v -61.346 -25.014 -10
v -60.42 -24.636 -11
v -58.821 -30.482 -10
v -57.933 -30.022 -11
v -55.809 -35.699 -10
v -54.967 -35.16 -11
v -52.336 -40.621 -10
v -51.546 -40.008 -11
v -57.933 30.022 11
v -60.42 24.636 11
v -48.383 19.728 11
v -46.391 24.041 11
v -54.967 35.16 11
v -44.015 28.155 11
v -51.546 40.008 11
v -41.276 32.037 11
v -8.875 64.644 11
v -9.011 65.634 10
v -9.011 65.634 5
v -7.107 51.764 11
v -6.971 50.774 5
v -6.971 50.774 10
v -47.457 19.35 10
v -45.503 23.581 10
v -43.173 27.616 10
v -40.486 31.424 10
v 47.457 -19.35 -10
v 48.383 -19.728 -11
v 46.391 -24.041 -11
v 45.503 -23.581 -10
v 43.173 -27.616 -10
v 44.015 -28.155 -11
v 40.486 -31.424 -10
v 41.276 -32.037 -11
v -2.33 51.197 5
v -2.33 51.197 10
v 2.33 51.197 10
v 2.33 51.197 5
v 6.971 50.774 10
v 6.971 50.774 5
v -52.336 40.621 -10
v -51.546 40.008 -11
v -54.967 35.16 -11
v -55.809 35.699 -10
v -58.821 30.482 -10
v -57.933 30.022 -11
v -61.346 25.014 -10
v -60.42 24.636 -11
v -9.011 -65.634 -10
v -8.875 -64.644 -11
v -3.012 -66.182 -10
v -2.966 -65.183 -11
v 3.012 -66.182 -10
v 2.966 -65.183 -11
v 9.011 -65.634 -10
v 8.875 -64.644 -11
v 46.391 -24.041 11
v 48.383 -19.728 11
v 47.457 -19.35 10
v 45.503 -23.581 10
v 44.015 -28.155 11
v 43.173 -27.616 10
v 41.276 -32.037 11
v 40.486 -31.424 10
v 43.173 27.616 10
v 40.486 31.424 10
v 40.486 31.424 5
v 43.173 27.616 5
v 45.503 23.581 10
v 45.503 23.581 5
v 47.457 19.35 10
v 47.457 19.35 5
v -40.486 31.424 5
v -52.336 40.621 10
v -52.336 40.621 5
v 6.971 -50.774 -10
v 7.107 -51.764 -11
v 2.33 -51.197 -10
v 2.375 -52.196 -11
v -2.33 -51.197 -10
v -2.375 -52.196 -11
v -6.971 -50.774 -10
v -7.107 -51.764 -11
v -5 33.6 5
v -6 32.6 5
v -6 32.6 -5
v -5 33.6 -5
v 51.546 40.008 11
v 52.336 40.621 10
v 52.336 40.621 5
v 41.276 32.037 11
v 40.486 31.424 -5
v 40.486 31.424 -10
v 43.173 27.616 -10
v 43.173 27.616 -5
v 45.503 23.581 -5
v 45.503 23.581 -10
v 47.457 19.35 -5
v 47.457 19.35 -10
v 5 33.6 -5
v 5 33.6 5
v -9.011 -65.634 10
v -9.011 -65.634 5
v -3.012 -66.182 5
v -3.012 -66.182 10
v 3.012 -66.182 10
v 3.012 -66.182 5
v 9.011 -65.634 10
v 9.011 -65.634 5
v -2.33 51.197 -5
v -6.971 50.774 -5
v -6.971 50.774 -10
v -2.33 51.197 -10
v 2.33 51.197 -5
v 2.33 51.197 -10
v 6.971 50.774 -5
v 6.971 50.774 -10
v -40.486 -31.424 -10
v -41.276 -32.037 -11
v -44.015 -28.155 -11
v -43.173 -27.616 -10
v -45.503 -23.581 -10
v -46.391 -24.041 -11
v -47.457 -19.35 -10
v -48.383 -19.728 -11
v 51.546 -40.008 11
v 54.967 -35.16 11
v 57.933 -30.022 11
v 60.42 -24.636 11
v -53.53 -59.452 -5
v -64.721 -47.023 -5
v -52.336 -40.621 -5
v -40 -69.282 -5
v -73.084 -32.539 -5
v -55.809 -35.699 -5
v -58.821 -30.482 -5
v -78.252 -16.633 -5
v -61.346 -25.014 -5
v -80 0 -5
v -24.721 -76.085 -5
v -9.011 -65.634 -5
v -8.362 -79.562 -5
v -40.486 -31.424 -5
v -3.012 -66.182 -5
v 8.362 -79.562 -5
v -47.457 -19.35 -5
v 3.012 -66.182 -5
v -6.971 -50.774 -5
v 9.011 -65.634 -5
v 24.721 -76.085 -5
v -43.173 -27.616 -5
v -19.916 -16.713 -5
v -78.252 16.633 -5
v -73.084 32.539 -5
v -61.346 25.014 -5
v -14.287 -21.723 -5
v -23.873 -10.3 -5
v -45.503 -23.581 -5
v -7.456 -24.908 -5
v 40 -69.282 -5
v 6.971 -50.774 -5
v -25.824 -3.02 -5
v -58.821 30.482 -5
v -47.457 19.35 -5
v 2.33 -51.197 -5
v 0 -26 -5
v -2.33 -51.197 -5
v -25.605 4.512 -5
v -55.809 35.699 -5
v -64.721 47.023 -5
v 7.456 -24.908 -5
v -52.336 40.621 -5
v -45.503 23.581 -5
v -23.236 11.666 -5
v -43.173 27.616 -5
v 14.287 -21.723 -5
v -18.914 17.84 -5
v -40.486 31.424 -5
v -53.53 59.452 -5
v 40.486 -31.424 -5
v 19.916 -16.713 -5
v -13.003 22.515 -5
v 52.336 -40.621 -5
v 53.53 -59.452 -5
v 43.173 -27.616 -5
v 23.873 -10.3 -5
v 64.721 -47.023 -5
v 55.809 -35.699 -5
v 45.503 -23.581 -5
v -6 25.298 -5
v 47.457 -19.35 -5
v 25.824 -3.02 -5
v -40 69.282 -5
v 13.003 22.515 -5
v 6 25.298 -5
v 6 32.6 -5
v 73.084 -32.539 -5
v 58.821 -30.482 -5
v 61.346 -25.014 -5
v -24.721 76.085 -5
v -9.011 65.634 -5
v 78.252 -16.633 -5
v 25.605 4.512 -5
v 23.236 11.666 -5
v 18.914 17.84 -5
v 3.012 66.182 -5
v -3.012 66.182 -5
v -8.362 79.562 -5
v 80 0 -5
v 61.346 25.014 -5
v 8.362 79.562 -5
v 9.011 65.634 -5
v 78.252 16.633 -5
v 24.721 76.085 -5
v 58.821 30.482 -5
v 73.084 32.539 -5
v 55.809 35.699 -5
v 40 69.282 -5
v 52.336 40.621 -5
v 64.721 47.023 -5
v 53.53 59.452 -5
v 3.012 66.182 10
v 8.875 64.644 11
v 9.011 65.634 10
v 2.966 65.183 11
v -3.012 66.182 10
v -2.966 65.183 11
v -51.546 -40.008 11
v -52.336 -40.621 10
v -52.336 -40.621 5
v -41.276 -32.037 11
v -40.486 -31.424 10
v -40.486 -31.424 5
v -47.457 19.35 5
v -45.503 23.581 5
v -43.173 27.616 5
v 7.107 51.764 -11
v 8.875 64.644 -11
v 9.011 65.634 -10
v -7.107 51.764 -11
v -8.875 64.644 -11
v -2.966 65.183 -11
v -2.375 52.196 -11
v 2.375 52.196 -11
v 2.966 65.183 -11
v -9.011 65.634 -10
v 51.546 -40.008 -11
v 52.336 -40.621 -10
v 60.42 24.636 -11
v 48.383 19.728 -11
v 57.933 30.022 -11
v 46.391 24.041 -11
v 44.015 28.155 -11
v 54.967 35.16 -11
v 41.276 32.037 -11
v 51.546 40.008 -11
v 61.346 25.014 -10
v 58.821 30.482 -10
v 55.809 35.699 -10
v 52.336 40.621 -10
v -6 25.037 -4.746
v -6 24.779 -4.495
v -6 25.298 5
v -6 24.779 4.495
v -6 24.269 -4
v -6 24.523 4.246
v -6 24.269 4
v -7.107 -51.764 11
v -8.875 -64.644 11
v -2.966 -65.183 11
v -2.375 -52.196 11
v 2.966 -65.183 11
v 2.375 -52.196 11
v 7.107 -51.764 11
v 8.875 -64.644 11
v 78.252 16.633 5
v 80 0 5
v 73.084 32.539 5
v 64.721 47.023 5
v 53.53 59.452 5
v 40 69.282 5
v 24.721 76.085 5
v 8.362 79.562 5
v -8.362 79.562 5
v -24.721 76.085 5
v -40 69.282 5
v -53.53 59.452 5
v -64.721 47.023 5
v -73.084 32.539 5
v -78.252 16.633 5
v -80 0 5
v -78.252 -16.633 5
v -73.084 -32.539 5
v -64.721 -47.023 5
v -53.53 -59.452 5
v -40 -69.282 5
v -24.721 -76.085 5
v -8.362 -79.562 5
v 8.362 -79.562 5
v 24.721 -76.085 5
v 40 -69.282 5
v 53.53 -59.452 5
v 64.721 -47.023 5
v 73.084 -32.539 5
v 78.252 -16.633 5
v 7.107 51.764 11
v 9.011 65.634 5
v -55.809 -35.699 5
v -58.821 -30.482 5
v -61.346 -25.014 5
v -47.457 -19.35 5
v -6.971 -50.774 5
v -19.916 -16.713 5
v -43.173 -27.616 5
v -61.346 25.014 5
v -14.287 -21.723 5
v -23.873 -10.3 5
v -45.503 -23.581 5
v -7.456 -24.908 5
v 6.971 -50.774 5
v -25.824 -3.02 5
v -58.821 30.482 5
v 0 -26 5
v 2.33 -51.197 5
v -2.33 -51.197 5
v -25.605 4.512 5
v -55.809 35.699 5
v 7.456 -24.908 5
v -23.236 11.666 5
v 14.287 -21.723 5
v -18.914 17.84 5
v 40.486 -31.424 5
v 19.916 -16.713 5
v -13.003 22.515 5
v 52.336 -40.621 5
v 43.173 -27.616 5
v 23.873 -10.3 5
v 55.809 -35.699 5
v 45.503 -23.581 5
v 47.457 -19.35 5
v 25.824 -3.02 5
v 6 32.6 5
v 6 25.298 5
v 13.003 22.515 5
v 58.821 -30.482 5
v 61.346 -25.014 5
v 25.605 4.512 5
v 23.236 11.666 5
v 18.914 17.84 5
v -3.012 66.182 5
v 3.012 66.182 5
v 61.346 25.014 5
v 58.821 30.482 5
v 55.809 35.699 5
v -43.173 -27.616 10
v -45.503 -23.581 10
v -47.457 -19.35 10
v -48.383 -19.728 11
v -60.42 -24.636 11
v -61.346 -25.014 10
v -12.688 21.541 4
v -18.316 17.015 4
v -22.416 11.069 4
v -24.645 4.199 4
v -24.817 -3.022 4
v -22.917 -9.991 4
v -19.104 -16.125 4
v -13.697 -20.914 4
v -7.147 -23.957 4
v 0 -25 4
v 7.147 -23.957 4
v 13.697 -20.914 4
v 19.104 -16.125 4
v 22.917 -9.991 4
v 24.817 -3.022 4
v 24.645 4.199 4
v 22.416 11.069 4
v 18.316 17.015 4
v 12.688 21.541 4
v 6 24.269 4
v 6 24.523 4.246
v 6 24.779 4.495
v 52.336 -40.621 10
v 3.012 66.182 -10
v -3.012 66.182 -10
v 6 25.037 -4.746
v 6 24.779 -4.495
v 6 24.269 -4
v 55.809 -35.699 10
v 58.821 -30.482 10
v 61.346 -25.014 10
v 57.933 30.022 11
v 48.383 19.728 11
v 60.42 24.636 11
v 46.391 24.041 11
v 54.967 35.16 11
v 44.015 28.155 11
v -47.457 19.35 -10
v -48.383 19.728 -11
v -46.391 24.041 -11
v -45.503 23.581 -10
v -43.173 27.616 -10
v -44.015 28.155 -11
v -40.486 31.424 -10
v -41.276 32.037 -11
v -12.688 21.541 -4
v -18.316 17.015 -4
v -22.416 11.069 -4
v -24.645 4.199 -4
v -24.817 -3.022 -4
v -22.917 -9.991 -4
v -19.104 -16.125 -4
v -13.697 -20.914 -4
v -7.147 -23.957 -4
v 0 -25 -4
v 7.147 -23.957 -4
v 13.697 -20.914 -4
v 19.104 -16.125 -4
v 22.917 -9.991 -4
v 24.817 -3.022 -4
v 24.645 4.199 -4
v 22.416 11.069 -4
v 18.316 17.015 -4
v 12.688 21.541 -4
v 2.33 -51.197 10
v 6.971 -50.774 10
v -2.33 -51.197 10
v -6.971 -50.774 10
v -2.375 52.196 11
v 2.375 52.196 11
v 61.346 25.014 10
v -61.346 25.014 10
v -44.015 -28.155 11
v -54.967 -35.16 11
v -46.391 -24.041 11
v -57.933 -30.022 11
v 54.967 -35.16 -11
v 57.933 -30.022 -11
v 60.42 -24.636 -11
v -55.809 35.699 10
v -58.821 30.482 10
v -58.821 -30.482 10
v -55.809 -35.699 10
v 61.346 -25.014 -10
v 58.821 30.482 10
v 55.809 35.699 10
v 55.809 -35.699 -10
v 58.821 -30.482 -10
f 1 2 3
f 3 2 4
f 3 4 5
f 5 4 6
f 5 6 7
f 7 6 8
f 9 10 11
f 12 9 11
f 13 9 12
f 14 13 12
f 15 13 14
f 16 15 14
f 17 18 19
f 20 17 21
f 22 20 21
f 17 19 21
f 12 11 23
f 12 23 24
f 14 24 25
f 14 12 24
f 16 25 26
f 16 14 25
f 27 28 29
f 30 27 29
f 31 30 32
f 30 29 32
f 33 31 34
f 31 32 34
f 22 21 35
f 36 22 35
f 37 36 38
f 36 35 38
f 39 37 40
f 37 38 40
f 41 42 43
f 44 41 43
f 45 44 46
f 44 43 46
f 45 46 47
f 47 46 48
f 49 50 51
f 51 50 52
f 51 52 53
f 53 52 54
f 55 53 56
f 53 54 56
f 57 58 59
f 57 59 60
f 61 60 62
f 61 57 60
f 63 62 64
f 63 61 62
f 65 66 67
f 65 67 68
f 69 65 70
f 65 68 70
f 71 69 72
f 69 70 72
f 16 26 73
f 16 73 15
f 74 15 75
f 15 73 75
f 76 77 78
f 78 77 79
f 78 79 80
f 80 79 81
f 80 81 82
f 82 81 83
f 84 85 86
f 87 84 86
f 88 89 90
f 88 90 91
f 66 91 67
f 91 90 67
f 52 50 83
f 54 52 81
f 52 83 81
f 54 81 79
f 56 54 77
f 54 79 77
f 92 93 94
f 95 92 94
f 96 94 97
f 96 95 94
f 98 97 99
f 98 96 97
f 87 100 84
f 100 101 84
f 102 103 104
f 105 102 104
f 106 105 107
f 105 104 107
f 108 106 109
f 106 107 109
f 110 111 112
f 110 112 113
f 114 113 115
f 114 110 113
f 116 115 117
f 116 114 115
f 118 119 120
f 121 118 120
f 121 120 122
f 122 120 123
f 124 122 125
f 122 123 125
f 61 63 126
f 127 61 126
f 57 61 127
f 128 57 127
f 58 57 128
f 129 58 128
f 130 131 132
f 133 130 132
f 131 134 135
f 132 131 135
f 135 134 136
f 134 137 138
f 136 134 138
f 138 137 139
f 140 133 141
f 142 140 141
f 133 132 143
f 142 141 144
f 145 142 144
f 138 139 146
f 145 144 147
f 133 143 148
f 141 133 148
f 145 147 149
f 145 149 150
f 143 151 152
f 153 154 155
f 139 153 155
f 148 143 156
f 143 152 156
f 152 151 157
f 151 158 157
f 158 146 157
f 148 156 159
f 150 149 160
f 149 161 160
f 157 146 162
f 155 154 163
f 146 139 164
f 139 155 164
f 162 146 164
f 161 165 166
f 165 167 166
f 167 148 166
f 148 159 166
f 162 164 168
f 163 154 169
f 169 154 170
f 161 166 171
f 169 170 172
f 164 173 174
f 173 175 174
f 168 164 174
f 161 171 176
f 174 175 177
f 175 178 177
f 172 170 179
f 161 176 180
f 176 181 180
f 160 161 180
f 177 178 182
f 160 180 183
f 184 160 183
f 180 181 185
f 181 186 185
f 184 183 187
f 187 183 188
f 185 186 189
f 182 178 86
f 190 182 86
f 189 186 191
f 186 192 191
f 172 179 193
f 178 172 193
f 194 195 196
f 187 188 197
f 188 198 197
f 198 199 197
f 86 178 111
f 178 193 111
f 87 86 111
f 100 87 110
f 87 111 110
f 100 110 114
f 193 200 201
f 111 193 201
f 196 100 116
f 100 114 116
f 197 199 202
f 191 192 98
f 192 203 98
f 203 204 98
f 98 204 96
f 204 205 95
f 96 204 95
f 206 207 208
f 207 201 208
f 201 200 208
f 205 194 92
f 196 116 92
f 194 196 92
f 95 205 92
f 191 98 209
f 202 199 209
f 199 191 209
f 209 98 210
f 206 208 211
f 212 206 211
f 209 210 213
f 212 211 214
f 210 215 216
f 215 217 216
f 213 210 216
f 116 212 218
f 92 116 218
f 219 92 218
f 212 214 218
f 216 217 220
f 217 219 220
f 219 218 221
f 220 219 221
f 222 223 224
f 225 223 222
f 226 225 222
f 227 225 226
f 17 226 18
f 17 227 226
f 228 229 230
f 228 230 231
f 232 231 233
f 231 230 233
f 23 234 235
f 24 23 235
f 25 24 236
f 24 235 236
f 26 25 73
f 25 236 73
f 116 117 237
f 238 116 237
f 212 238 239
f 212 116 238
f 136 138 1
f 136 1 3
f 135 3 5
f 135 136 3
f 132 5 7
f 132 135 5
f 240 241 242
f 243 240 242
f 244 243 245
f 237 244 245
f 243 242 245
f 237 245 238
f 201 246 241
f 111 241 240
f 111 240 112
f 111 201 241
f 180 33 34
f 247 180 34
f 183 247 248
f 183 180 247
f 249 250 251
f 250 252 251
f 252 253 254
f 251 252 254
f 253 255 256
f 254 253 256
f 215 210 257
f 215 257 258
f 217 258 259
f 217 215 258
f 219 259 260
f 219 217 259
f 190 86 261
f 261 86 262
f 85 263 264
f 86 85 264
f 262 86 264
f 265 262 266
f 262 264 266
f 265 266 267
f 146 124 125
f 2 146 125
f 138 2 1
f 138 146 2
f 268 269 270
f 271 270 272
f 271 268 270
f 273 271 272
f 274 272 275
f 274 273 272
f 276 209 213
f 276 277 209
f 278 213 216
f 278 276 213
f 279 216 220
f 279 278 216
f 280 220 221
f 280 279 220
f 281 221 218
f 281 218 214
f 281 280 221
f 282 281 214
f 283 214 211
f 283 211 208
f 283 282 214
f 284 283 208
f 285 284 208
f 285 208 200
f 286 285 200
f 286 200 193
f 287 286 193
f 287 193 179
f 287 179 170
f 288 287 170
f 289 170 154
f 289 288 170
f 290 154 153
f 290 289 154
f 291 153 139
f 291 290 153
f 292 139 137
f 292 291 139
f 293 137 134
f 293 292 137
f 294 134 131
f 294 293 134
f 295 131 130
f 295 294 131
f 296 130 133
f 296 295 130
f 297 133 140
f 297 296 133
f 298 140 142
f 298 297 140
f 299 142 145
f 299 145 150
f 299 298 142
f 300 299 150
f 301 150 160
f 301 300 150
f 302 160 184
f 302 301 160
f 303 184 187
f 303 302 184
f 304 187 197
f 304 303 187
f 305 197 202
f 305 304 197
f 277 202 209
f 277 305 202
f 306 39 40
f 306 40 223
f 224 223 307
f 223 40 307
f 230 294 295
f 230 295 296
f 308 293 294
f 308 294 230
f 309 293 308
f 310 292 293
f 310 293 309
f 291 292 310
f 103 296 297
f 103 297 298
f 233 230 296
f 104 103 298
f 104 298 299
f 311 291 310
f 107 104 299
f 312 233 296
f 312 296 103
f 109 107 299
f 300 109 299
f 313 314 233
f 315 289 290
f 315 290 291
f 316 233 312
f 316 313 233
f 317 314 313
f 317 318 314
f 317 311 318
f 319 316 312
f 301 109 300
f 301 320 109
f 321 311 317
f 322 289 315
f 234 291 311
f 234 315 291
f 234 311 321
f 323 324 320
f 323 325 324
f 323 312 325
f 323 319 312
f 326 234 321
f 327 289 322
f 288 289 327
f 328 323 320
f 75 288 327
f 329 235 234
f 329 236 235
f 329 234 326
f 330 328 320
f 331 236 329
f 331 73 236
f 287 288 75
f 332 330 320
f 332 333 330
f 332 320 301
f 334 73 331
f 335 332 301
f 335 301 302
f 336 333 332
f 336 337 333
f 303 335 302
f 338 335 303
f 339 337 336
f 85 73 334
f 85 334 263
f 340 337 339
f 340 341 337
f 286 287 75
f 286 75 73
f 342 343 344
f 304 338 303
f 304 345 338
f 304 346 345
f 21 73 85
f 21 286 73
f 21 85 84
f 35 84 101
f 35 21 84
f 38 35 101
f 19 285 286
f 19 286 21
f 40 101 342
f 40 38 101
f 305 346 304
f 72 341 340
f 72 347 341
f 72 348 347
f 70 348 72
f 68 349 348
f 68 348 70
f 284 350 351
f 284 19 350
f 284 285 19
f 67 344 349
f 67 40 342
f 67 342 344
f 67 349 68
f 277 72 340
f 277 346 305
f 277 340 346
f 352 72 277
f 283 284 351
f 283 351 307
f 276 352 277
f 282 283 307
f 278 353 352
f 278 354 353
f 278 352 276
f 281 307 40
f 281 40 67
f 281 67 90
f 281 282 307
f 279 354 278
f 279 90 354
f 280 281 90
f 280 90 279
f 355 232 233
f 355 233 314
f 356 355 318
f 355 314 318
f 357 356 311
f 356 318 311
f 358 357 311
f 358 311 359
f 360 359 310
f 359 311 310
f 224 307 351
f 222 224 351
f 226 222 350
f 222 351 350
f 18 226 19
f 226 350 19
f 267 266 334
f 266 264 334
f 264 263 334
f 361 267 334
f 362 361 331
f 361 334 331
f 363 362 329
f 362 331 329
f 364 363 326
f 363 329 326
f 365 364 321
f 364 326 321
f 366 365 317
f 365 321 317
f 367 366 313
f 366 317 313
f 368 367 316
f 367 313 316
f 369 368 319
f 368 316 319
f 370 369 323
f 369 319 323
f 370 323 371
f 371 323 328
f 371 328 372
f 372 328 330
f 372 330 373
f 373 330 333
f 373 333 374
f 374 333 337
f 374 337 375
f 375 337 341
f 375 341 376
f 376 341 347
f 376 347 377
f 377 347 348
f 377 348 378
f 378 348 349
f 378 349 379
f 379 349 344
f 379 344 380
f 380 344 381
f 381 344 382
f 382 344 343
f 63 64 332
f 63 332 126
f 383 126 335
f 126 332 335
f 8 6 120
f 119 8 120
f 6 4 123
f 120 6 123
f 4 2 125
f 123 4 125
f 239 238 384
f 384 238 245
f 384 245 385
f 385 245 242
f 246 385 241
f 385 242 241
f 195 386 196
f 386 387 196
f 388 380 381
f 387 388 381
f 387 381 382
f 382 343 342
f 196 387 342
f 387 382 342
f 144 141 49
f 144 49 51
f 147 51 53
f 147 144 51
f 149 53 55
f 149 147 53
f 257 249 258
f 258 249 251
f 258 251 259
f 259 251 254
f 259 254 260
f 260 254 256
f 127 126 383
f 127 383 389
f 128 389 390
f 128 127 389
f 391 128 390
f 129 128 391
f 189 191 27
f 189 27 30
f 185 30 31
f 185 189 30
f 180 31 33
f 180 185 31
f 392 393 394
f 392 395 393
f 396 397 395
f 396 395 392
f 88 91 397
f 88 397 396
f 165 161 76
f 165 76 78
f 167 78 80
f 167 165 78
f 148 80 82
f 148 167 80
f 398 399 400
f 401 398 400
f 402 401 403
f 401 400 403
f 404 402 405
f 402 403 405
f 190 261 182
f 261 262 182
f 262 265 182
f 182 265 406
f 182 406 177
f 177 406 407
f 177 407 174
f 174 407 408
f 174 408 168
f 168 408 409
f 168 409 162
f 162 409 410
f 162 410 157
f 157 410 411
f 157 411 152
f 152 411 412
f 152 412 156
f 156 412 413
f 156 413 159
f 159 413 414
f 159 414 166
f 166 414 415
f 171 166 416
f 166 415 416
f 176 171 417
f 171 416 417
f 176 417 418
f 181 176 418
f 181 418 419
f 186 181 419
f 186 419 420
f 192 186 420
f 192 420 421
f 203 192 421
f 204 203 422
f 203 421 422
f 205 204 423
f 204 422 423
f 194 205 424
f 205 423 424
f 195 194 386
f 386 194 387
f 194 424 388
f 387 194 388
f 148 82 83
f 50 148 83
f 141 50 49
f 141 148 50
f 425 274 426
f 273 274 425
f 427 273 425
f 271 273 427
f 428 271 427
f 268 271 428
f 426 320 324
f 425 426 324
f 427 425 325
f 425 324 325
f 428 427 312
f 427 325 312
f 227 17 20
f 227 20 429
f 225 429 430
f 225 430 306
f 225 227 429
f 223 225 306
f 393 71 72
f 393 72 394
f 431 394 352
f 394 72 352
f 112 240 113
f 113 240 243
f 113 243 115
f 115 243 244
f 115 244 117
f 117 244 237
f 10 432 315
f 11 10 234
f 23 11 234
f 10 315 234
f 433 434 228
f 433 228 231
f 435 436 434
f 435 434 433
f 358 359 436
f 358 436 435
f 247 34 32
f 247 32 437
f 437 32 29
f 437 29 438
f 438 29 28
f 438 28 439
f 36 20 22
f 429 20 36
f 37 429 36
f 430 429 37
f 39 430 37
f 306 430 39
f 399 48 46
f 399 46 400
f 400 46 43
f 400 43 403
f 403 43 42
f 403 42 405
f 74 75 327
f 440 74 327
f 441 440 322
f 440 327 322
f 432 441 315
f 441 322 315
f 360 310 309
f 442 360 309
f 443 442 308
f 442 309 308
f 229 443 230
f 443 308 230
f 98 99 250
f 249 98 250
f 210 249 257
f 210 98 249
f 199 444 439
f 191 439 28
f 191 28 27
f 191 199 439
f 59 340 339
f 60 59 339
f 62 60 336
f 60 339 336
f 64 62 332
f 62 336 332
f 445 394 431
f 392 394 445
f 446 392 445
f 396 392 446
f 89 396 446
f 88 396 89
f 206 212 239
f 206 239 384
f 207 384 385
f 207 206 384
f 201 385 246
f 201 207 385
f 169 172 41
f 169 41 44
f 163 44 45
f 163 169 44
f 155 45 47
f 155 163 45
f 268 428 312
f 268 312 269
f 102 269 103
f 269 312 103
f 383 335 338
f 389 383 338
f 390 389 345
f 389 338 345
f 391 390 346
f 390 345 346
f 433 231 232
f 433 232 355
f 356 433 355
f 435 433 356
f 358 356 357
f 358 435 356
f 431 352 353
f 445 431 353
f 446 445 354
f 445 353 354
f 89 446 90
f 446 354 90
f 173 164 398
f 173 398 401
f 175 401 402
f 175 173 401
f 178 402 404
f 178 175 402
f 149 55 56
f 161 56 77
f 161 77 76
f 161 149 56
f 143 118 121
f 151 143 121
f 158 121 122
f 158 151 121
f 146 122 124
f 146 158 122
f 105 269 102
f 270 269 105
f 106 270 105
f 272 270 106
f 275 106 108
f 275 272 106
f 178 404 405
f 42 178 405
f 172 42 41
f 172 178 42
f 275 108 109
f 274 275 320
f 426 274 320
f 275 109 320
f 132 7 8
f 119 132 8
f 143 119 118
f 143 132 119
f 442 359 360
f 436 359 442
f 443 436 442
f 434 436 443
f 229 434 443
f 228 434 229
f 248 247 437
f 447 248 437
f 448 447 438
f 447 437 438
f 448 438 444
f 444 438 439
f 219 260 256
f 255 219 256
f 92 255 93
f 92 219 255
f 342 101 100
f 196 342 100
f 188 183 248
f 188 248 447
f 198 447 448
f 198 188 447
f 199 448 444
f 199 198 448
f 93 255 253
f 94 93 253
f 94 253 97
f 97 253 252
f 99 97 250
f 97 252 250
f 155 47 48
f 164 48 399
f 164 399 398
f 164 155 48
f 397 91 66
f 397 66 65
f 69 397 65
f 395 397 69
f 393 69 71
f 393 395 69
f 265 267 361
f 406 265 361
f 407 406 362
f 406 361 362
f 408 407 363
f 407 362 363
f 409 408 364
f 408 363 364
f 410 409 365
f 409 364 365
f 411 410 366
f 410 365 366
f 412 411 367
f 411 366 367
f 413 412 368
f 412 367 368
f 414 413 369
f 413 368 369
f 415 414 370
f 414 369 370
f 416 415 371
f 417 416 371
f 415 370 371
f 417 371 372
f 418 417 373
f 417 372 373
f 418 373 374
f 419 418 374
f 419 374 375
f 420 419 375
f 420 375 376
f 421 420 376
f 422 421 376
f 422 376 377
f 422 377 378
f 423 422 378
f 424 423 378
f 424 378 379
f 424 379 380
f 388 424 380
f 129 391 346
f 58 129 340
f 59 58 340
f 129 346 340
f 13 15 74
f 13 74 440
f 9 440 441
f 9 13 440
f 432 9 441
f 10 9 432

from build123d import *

# Parameters (mm, degrees)
SKETCH1_R                = 80
BOSS_EXTRUDE1_DEPTH      = 5
BOSS_EXTRUDE2_DEPTH      = 6
CHAMFER1_SIZE            = 1
CHAMFER1_OF_MIRROR1_SIZE = 1
CHAMFER2_SIZE            = 1
CHAMFER3_SIZE            = 1


with BuildPart() as part:
    # Sketch1 → Boss-Extrude1 (new body, symmetric)
    with BuildSketch(Plane.XY):
        Circle(SKETCH1_R)
        with BuildLine():
            Line((6, 24.269322199), (6, 33.6))
            Line((6, 33.6), (-6, 33.6))
            Line((-6, 33.6), (-6, 24.269322199))
            ThreePointArc((-6, 24.269322199), (0, -25), (6, 24.269322199))
        make_face(mode=Mode.SUBTRACT)
    extrude(amount=BOSS_EXTRUDE1_DEPTH, both=True)

    # Sketch2 → Boss-Extrude2 (add)
    with BuildSketch(Plane.XY.offset(5)):
        with BuildLine():
            ThreePointArc((-6.97050931, 50.773757985), (0, 51.25), (6.97050931, 50.773757985))
            Line((6.97050931, 50.773757985), (9.010658377, 65.634370079))
            ThreePointArc((9.010658377, 65.634370079), (0, 66.25), (-9.010658377, 65.634370079))
            Line((-9.010658377, 65.634370079), (-6.97050931, 50.773757985))
        make_face()
        with BuildLine():
            ThreePointArc((40.486109606, 31.423517133), (44.383801944, 25.625), (47.456618916, 19.350240853))
            Line((47.456618916, 19.350240853), (61.346361038, 25.01372598))
            ThreePointArc((61.346361038, 25.01372598), (57.374183001, 33.125), (52.335702661, 40.620644098))
            Line((52.335702661, 40.620644098), (40.486109606, 31.423517133))
        make_face()
        with BuildLine():
            ThreePointArc((47.456618916, -19.350240853), (44.383801944, -25.625), (40.486109606, -31.423517133))
            Line((40.486109606, -31.423517133), (52.335702661, -40.620644098))
            ThreePointArc((52.335702661, -40.620644098), (57.374183001, -33.125), (61.346361038, -25.01372598))
            Line((61.346361038, -25.01372598), (47.456618916, -19.350240853))
        make_face()
        with BuildLine():
            ThreePointArc((6.97050931, -50.773757985), (0, -51.25), (-6.97050931, -50.773757985))
            Line((-6.97050931, -50.773757985), (-9.010658377, -65.634370079))
            ThreePointArc((-9.010658377, -65.634370079), (0, -66.25), (9.010658377, -65.634370079))
            Line((9.010658377, -65.634370079), (6.97050931, -50.773757985))
        make_face()
        with BuildLine():
            ThreePointArc((-40.486109606, -31.423517133), (-44.383801944, -25.625), (-47.456618916, -19.350240853))
            Line((-47.456618916, -19.350240853), (-61.346361038, -25.01372598))
            ThreePointArc((-61.346361038, -25.01372598), (-57.374183001, -33.125), (-52.335702661, -40.620644098))
            Line((-52.335702661, -40.620644098), (-40.486109606, -31.423517133))
        make_face()
        with BuildLine():
            ThreePointArc((-47.456618916, 19.350240853), (-44.383801944, 25.625), (-40.486109606, 31.423517133))
            Line((-40.486109606, 31.423517133), (-52.335702661, 40.620644098))
            ThreePointArc((-52.335702661, 40.620644098), (-57.374183001, 33.125), (-61.346361038, 25.01372598))
            Line((-61.346361038, 25.01372598), (-47.456618916, 19.350240853))
        make_face()
    boss_extrude2 = extrude(amount=BOSS_EXTRUDE2_DEPTH)

    # Chamfer1
    chamfer1_edges = [part.edges().sort_by_distance(p)[0] for p in [
        (0, 51.25, 11),
        (0, 66.25, 11),
        (44.383801944, 25.625, 11),
        (57.374183001, 33.125, 11),
        (44.383801944, -25.625, 11),
        (57.374183001, -33.125, 11),
        (0, -51.25, 11),
        (0, -66.25, 11),
        (-44.383801944, -25.625, 11),
        (-57.374183001, -33.125, 11),
        (-44.383801944, 25.625, 11),
        (-57.374183001, 33.125, 11),
    ]]
    chamfer(chamfer1_edges, length=CHAMFER1_SIZE)

    # Mirror1: Boss-Extrude2 across plane
    add(boss_extrude2.mirror(Plane.XY))

    # Chamfer1 of Mirror1
    chamfer1_of_mirror1_edges = [part.edges().sort_by_distance(p)[0] for p in [
        (0, 51.25, -11),
        (0, 66.25, -11),
        (44.383801944, 25.625, -11),
        (57.374183001, 33.125, -11),
        (44.383801944, -25.625, -11),
        (57.374183001, -33.125, -11),
        (0, -51.25, -11),
        (0, -66.25, -11),
        (-44.383801944, -25.625, -11),
        (-57.374183001, -33.125, -11),
        (-44.383801944, 25.625, -11),
        (-57.374183001, 33.125, -11),
    ]]
    chamfer(chamfer1_of_mirror1_edges, length=CHAMFER1_OF_MIRROR1_SIZE)

    # Chamfer2
    chamfer2_edges = [part.edges().sort_by_distance(p)[0] for p in [
        (0, -25, 5),
        (0, -25, -5),
    ]]
    chamfer(chamfer2_edges, length=CHAMFER2_SIZE)

    # Chamfer3
    chamfer3_edges = [part.edges().sort_by_distance(p)[0] for p in [
        (6, 33.6, 0),
        (-6, 33.6, 0),
    ]]
    chamfer(chamfer3_edges, length=CHAMFER3_SIZE)


solid = part.part
